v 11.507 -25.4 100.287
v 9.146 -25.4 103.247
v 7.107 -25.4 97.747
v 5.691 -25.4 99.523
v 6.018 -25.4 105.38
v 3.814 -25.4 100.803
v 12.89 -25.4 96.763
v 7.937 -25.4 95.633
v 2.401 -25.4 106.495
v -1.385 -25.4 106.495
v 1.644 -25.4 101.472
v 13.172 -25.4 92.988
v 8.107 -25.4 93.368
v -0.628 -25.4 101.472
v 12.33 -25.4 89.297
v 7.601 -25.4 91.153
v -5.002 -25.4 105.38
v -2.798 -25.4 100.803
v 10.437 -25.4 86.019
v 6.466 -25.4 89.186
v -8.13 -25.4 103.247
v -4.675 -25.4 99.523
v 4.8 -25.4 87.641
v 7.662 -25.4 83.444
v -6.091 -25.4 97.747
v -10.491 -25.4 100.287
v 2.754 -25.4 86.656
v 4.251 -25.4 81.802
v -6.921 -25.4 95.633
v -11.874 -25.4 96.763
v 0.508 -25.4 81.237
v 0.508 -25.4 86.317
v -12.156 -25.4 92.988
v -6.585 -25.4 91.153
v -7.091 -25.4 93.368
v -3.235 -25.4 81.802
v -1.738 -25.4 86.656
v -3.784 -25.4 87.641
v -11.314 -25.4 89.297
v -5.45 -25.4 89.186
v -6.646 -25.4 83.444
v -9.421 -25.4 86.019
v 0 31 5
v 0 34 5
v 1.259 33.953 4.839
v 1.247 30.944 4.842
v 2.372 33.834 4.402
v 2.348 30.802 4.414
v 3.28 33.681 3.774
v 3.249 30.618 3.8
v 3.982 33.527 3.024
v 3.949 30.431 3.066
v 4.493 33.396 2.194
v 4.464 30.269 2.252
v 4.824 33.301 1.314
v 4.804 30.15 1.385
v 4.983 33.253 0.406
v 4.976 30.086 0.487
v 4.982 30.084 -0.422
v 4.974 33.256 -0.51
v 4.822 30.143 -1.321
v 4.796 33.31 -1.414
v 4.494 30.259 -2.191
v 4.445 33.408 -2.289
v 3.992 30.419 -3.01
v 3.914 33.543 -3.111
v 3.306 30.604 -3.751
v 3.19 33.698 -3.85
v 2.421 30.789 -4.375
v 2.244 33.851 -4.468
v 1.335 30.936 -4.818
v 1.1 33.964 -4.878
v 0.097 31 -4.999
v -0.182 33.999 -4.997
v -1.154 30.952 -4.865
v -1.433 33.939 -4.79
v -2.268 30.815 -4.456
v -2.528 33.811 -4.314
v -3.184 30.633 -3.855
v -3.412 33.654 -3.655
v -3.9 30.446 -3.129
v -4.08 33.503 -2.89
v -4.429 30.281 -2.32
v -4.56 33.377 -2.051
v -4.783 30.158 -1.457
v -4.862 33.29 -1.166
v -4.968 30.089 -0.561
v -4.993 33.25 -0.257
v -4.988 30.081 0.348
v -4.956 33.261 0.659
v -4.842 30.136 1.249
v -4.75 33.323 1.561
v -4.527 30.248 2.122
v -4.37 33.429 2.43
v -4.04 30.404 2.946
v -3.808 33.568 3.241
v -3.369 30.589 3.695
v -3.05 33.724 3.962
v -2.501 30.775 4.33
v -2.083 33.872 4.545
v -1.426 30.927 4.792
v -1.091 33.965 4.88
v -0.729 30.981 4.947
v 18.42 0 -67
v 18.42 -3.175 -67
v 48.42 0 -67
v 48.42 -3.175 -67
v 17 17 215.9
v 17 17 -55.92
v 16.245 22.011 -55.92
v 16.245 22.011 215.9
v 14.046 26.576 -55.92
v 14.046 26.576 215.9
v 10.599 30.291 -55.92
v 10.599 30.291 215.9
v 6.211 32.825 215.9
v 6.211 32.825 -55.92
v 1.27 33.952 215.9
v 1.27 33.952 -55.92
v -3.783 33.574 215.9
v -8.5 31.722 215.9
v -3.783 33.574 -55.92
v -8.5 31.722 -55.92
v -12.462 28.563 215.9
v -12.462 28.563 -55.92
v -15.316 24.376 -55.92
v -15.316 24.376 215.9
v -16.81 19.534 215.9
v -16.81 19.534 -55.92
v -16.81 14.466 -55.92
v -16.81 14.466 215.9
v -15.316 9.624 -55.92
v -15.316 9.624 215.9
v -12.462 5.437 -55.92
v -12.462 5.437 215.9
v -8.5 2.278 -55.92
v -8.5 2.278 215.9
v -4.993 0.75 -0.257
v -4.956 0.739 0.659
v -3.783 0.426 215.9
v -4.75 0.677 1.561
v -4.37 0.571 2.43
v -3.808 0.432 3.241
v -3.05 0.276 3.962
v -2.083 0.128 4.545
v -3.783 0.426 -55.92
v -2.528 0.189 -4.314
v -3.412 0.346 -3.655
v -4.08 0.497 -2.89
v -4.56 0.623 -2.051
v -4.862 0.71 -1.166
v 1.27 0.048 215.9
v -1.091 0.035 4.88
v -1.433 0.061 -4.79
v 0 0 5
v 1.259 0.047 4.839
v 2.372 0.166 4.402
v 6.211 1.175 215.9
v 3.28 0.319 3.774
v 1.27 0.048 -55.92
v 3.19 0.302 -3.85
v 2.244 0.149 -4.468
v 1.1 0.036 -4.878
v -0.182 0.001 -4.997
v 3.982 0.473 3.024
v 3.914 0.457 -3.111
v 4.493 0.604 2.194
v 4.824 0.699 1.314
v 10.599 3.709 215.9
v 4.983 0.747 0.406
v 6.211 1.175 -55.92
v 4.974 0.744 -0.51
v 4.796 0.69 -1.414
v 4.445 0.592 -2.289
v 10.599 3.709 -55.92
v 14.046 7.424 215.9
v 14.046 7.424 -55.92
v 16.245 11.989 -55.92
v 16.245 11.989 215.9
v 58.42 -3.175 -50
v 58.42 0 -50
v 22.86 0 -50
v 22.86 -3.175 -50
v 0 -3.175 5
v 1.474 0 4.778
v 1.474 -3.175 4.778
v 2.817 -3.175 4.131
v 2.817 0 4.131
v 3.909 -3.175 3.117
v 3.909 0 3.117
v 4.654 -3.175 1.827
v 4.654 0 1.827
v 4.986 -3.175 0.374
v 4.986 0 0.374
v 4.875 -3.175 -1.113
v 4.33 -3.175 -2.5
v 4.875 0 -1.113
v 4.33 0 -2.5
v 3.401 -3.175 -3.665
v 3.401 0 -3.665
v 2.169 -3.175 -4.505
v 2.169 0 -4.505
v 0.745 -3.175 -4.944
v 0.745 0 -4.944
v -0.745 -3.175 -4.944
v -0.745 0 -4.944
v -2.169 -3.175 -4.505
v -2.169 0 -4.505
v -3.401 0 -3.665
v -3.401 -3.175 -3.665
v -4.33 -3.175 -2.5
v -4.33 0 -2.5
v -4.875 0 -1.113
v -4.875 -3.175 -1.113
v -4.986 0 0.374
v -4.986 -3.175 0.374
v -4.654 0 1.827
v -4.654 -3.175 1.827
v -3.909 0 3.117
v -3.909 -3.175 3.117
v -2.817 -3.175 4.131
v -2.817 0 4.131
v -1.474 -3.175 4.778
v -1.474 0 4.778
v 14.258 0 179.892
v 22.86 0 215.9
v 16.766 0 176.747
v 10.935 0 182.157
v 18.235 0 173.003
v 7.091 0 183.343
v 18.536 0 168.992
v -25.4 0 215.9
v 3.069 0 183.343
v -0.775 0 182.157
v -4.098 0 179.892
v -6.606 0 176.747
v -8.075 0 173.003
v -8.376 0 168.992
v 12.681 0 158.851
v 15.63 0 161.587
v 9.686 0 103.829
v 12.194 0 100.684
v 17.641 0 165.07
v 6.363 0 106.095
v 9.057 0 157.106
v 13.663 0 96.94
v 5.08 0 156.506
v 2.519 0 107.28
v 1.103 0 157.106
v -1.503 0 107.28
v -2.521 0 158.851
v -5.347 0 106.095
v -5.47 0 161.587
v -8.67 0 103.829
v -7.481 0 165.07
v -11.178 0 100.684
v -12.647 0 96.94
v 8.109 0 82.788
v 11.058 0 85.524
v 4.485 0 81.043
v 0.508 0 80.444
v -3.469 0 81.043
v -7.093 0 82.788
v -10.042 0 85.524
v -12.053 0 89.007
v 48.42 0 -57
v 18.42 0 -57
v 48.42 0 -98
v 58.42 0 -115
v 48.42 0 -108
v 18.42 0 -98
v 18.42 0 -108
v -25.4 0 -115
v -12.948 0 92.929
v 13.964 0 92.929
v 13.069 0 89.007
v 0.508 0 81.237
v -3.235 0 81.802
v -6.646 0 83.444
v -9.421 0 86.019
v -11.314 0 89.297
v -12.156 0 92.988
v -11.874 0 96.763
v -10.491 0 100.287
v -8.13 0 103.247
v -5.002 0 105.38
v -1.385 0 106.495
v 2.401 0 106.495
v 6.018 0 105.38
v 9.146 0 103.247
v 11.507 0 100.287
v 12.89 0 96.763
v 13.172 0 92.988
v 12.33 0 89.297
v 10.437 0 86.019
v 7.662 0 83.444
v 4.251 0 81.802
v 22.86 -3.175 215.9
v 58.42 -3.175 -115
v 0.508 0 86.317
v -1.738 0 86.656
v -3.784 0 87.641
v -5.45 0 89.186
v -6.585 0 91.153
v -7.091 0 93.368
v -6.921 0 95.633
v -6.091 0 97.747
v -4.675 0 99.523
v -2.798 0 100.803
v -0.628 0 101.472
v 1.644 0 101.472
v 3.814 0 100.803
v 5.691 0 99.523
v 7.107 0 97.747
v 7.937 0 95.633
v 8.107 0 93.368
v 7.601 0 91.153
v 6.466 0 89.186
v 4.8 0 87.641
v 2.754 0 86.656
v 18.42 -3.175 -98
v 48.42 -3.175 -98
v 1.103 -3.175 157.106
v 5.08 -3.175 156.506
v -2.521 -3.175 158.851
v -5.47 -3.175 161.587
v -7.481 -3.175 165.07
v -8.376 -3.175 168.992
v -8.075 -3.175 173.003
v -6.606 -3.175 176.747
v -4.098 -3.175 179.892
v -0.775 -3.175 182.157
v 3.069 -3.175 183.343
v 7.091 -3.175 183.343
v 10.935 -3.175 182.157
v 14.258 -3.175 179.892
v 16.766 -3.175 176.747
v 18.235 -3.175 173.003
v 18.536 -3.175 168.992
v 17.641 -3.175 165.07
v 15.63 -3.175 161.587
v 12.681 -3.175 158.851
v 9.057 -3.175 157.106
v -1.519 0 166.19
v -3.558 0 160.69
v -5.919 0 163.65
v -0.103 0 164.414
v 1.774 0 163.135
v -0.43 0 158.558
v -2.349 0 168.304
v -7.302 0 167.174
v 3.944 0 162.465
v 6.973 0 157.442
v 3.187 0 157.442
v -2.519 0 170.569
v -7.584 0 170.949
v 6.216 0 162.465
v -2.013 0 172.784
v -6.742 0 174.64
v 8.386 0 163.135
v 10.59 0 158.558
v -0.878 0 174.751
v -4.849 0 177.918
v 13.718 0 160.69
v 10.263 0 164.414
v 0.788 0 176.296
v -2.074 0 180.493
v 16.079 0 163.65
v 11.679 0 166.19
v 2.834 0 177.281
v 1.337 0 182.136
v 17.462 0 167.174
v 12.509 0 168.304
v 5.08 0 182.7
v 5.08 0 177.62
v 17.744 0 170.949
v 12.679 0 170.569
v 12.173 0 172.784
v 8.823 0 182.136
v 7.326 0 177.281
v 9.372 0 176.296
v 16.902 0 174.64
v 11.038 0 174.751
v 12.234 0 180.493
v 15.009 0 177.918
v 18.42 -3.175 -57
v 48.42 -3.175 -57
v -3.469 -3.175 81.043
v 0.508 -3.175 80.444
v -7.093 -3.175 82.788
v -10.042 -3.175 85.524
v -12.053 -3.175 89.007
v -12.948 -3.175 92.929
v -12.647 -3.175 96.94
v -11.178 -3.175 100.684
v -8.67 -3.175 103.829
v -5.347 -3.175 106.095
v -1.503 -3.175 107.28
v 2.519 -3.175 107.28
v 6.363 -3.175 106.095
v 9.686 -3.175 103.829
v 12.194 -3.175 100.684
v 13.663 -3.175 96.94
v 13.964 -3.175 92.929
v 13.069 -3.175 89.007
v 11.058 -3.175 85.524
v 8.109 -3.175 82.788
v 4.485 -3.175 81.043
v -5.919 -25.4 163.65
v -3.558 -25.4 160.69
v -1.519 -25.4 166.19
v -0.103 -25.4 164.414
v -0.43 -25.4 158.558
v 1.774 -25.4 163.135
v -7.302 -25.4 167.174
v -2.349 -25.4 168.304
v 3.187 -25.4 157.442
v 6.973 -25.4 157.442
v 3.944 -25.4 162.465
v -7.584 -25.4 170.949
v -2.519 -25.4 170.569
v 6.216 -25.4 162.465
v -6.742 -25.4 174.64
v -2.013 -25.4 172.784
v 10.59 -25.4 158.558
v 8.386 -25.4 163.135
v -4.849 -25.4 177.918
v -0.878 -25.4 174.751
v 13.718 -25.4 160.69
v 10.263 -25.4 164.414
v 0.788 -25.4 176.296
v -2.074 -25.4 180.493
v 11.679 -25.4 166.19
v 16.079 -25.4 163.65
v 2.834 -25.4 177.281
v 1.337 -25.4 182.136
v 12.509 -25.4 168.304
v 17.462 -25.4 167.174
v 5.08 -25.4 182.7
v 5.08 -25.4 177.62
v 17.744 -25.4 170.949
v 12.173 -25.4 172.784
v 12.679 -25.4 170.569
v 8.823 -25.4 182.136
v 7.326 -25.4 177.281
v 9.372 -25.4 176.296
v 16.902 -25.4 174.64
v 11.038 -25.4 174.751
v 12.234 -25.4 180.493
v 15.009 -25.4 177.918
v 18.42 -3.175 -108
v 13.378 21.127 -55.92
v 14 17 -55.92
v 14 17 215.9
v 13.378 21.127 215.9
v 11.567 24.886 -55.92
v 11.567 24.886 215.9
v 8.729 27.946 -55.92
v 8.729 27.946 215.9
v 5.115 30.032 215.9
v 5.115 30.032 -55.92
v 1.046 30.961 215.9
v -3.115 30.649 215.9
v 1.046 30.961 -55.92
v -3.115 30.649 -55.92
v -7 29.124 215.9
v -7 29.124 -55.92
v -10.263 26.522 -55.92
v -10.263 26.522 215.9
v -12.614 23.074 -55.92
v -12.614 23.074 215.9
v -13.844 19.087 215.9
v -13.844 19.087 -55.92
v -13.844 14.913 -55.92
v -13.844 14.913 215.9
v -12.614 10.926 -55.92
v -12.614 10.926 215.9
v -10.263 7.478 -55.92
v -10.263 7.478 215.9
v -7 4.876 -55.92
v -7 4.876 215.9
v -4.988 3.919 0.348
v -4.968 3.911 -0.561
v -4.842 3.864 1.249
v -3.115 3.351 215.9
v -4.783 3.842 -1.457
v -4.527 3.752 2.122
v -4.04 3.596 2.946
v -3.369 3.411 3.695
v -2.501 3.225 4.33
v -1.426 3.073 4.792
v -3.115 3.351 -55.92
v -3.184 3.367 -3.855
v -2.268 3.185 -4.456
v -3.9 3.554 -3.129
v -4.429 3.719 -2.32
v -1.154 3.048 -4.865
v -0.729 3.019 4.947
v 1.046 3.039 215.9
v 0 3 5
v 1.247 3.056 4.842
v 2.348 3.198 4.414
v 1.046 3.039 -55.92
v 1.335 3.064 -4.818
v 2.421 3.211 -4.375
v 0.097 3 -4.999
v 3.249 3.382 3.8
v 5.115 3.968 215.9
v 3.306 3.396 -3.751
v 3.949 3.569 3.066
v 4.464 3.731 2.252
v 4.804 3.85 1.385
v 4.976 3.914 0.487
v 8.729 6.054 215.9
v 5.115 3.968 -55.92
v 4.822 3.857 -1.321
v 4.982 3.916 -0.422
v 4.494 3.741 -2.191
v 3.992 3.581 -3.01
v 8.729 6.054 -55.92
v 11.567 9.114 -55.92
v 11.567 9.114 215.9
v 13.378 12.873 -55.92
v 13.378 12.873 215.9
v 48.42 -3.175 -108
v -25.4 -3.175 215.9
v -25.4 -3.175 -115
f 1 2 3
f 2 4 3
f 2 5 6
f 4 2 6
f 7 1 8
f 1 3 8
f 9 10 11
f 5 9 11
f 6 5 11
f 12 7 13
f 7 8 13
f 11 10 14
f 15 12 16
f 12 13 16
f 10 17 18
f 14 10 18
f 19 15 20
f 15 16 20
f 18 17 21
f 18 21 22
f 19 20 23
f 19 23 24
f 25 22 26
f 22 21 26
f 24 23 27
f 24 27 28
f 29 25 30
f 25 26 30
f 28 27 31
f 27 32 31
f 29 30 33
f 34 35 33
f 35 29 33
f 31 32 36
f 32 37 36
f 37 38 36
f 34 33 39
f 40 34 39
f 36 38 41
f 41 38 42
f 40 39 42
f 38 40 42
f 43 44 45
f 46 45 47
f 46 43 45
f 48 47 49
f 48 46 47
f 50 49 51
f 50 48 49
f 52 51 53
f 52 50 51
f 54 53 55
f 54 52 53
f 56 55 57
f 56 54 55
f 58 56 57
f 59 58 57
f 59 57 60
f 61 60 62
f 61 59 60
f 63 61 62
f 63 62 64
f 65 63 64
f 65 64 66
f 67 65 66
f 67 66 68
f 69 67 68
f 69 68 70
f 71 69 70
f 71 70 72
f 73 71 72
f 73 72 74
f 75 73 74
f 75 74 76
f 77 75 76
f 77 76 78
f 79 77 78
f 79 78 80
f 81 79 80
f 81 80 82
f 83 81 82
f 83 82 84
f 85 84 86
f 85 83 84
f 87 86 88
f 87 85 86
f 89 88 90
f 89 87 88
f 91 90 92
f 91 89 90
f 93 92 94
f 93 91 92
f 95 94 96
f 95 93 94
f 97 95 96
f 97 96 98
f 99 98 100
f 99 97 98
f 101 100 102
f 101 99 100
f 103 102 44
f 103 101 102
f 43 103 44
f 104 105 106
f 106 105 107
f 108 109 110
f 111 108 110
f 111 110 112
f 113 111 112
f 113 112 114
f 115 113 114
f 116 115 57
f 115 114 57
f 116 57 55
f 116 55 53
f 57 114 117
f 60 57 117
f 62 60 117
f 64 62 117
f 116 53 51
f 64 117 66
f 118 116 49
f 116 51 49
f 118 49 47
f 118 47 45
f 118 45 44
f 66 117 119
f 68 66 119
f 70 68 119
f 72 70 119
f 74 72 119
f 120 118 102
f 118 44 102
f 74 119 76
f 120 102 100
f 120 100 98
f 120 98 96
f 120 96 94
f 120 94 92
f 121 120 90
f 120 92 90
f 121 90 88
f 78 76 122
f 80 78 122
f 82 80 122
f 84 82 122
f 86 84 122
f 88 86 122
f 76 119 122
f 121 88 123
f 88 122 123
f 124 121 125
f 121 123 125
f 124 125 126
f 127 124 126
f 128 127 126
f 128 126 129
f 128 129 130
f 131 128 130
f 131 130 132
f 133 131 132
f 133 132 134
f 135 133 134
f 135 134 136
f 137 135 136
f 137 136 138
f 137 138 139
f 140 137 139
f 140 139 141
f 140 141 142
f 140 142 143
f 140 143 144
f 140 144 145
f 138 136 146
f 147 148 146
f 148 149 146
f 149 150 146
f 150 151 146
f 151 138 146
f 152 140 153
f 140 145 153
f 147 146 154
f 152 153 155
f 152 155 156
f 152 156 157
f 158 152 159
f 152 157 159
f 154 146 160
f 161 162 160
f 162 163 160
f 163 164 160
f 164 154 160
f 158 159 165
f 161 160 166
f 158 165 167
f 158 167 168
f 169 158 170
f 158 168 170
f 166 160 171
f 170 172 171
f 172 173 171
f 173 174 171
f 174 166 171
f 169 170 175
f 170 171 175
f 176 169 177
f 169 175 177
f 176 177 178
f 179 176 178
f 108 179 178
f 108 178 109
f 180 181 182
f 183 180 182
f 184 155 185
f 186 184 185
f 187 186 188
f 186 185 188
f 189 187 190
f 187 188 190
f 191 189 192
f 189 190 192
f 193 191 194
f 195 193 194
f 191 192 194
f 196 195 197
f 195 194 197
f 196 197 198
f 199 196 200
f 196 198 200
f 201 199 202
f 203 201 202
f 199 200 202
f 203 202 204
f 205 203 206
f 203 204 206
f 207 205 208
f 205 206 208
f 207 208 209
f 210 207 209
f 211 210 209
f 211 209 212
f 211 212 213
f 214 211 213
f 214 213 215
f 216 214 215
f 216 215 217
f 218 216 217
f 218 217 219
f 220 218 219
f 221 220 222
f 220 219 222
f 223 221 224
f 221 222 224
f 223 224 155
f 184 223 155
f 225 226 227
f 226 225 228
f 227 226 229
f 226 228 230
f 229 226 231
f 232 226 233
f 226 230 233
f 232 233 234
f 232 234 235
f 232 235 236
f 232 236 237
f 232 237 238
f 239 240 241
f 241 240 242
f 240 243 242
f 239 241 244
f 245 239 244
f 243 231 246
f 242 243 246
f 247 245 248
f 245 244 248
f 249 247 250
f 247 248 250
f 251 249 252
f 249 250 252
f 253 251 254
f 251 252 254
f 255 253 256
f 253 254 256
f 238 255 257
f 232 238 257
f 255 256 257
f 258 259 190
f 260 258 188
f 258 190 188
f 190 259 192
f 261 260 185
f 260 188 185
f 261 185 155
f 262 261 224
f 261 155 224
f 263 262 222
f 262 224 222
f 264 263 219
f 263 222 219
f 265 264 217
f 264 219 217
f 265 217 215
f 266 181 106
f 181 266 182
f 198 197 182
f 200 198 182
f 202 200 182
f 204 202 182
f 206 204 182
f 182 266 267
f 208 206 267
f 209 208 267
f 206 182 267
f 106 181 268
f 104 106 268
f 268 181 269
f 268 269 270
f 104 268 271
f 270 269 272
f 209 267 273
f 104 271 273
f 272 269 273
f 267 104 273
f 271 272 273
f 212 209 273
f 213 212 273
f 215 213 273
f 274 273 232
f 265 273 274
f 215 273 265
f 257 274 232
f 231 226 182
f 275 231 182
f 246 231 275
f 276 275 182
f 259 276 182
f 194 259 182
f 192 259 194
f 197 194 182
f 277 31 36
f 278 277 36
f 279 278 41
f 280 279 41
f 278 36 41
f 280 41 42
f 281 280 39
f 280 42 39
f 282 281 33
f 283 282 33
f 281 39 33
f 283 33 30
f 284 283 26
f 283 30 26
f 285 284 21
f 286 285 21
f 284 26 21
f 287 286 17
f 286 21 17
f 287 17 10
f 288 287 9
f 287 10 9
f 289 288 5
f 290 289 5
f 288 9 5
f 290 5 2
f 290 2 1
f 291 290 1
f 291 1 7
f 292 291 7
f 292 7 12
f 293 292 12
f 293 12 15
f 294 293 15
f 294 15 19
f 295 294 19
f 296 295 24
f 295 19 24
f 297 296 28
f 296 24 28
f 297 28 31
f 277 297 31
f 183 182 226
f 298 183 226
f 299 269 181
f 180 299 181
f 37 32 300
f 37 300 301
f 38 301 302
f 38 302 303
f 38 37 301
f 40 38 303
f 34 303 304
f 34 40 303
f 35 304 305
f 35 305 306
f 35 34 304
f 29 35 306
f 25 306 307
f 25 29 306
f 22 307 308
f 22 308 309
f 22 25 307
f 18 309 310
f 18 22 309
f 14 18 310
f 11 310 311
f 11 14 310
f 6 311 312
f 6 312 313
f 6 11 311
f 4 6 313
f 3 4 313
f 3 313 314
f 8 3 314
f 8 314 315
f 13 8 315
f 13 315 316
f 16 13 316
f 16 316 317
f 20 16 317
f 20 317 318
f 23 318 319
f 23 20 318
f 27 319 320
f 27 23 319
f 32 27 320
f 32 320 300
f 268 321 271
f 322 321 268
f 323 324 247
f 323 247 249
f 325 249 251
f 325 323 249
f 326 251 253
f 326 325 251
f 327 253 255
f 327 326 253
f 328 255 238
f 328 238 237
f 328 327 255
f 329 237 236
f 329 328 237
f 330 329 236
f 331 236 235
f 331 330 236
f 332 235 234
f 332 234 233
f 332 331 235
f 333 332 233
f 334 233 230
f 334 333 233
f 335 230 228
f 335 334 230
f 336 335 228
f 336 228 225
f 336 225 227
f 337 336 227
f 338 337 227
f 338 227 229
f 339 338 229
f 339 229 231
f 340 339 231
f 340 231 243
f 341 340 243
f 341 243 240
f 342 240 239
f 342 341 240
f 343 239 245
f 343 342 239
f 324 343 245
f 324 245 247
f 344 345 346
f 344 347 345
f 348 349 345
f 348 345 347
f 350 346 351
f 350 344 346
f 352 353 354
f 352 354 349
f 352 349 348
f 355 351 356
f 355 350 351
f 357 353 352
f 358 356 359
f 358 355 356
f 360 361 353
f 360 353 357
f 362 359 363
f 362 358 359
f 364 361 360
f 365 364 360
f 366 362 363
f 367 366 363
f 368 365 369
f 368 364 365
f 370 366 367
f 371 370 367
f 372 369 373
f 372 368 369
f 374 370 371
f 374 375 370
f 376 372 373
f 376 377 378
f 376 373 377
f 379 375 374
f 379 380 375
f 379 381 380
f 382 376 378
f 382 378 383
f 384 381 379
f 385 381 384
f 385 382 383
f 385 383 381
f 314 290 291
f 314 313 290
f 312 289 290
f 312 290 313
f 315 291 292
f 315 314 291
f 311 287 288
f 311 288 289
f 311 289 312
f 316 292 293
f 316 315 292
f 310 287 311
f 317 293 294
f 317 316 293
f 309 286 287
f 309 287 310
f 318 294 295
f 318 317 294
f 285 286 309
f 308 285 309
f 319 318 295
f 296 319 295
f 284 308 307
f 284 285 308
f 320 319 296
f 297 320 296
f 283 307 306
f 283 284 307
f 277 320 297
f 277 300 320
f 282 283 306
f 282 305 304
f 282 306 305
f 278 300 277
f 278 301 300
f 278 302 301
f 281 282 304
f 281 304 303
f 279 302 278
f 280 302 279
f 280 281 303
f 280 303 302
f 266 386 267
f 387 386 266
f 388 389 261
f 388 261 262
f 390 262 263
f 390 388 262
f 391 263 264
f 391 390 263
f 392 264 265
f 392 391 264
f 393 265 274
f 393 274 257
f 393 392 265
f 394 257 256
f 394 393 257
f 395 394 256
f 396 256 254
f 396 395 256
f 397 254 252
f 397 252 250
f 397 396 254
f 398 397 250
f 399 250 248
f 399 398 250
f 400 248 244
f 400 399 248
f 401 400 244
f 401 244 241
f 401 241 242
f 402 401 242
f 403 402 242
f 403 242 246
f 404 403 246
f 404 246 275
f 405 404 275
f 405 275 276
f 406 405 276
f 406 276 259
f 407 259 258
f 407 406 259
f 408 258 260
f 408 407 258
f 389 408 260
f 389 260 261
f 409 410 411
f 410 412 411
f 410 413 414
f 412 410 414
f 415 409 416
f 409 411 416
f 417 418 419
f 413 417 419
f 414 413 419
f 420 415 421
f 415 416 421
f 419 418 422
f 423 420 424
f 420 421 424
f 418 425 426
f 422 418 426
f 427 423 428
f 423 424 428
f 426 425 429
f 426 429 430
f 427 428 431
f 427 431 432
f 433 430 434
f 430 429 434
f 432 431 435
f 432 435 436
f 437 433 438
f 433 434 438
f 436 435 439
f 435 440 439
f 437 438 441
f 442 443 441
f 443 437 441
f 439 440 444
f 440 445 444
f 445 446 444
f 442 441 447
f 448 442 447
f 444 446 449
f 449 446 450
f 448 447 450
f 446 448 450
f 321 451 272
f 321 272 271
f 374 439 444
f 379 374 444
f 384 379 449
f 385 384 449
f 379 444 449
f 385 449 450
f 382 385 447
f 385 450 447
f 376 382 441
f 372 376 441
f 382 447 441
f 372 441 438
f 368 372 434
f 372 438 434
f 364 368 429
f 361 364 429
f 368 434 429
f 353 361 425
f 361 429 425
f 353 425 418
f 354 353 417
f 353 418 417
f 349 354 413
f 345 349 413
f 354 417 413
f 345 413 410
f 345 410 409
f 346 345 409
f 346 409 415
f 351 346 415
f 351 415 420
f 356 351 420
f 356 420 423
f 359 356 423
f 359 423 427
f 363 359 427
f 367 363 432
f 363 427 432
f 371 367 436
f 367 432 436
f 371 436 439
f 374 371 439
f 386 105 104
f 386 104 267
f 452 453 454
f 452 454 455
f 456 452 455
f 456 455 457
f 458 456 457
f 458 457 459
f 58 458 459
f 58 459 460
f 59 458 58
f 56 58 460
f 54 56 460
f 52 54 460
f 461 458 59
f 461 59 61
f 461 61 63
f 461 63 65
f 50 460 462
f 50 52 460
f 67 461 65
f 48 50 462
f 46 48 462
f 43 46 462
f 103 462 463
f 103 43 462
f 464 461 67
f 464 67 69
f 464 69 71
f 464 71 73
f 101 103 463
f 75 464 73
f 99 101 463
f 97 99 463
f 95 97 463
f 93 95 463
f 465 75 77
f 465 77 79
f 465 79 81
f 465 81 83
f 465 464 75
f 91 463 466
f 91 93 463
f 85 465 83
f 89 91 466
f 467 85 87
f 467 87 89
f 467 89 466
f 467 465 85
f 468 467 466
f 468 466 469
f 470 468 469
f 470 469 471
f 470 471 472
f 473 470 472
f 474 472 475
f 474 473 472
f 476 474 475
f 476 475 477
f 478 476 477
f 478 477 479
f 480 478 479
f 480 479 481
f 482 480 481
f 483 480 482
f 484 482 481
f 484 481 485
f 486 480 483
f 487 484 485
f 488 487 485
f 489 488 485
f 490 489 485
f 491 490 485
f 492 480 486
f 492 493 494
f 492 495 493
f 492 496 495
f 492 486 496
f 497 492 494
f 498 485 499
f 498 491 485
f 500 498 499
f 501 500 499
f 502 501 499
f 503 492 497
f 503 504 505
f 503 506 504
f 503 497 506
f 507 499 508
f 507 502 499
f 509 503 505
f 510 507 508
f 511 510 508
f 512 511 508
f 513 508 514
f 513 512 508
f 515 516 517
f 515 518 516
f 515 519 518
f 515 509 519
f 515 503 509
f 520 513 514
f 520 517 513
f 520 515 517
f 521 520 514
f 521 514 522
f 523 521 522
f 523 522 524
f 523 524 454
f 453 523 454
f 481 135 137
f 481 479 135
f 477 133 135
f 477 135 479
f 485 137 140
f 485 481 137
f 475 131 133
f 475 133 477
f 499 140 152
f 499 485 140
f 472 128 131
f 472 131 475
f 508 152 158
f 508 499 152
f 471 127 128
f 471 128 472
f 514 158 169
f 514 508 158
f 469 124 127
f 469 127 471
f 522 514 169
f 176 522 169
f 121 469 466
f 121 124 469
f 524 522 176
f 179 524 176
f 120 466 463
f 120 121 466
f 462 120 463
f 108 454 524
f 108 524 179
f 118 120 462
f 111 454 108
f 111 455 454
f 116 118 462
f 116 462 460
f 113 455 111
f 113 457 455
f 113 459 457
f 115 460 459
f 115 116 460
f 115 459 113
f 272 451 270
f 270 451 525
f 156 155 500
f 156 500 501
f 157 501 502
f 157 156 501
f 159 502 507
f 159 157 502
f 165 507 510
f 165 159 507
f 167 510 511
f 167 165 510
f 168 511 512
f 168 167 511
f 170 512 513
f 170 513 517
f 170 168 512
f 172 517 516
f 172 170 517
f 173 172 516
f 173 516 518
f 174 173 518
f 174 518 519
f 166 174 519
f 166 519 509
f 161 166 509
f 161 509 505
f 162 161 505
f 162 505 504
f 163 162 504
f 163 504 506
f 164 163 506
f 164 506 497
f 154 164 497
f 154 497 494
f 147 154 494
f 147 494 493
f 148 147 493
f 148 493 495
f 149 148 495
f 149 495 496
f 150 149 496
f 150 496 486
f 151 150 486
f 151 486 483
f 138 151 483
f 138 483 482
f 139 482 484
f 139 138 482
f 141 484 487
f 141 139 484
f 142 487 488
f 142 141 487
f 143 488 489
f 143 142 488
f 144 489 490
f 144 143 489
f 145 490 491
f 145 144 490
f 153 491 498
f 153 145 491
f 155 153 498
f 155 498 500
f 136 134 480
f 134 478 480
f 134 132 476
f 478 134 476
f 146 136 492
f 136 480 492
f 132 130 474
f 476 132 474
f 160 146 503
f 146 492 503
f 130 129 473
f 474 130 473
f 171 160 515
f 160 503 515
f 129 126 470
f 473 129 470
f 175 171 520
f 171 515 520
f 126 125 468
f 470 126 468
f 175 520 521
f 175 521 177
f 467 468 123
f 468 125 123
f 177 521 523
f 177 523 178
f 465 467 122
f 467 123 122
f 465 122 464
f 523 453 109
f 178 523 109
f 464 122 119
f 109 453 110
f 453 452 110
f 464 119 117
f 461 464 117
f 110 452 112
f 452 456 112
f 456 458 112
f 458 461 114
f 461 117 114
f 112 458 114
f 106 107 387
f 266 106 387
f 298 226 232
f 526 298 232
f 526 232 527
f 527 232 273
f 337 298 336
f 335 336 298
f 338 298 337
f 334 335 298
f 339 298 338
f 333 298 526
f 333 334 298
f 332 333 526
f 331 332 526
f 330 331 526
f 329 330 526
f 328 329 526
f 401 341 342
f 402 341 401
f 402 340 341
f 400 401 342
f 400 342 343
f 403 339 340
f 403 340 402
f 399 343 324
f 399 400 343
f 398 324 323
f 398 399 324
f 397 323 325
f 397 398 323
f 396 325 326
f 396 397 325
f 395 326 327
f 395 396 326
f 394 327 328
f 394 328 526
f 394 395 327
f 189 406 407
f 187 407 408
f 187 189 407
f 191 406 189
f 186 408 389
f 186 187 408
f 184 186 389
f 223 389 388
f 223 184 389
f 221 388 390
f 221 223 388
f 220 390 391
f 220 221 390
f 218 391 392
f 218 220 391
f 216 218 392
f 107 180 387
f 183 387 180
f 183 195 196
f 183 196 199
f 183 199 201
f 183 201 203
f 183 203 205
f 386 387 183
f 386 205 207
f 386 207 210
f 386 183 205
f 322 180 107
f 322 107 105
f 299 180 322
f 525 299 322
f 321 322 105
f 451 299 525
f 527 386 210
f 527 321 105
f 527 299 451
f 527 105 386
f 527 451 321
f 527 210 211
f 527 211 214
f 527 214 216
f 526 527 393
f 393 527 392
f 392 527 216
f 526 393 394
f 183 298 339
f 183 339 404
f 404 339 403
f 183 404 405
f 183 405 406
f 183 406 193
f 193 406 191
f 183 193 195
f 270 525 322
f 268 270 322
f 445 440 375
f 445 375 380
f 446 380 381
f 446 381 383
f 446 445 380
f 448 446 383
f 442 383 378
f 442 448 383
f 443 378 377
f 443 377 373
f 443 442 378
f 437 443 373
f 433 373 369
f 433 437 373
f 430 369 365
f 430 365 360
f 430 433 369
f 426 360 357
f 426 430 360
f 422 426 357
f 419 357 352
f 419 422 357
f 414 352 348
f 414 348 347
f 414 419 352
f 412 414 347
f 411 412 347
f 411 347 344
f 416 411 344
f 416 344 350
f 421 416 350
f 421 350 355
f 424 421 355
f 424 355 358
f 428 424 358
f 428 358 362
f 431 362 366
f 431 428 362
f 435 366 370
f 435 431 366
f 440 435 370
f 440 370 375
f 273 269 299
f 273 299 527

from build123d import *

# Parameters (mm, degrees)
SKETCH1_R                  = 5
BASE_FLANGE1_DEPTH         = 3.175
BOSS_EXTRUDE2_DEPTH        = 215.9
BOSS_EXTRUDE2_DEPTH_BACK   = 55.92
SKETCH7_R                  = 17
SKETCH7_R_2                = 14
CUT_EXTRUDE1_DEPTH         = 227.233742841
CUT_EXTRUDE1_DEPTH_BACK    = 227.233742841
SKETCH8_R                  = 5
SKETCH9_W                  = 30
SKETCH9_H                  = 10
CUT_EXTRUDE2_DEPTH         = 3.175
SKETCH6_R                  = 13.49375
CUT_EXTRUDE4_DEPTH         = 3.175
BOSS_EXTRUDE3_DEPTH        = 3.175
BOSS_EXTRUDE3_DEPTH_BACK   = 22.225
SKETCH6_5_R                = 12.7
SKETCH6_5_R_2              = 7.62
BOSS_EXTRUDE3_2_DEPTH      = 3.175
BOSS_EXTRUDE3_2_DEPTH_BACK = 22.225


# Sheet-metal steps are written as plain solids
with BuildPart() as part:
    # Sketch1 → Base-Flange1 (new body)
    with BuildSketch(Plane(origin=(0, 0, 0), x_dir=(1, 0, 0), z_dir=(0, 1, 0))):
        Polygon((22.86, -215.9), (-25.4, -215.9), (-25.4, 115), (22.86, 115), (58.42, 115), (58.42, 50), (22.86, 50), align=None)
        with Locations(Location((0, 0, 0), (0, 0, 270))):
            Circle(SKETCH1_R, mode=Mode.SUBTRACT)
    extrude(amount=-BASE_FLANGE1_DEPTH)

    # Sketch9 → Cut-Extrude2 (cut)
    with BuildSketch(Plane.XZ.offset(3.175)):
        with Locations((33.42, -103)):
            Rectangle(SKETCH9_W, SKETCH9_H)
        with Locations((33.42, -62)):
            Rectangle(SKETCH9_W, SKETCH9_H)
    extrude(amount=-CUT_EXTRUDE2_DEPTH, mode=Mode.SUBTRACT)

    # Sketch6 → Cut-Extrude4 (cut)
    with BuildSketch(Plane(origin=(0, -3.175, 0), x_dir=(1, 0, 0), z_dir=(0, 1, 0))):
        with Locations(Location((5.08, -170, 0), (0, 0, 90))):
            Circle(SKETCH6_R)
        with Locations(Location((0.508, -93.937283667, 0), (0, 0, 90))):
            Circle(SKETCH6_R)
    extrude(amount=CUT_EXTRUDE4_DEPTH, mode=Mode.SUBTRACT)


with BuildPart() as body_2:
    # Sketch7 → Boss-Extrude2 (new, two sides: drawn at the far end of the back side and taken through both)
    with BuildSketch(Plane.XY.offset(-BOSS_EXTRUDE2_DEPTH_BACK)):
        with Locations((0, 17)):
            Circle(SKETCH7_R)
        with Locations((0, 17)):
            Circle(SKETCH7_R_2, mode=Mode.SUBTRACT)
    extrude(amount=BOSS_EXTRUDE2_DEPTH + BOSS_EXTRUDE2_DEPTH_BACK)

    # Sketch8 → Cut-Extrude1 (cut, two sides: drawn at the far end of the back side and taken through both)
    with BuildSketch(Plane(origin=(0, 0, 0), x_dir=(1, 0, 0), z_dir=(0, 1, 0)).offset(-CUT_EXTRUDE1_DEPTH_BACK)):
        with Locations(Location((0, 0, 0), (0, 0, 270))):
            Circle(SKETCH8_R)
    extrude(amount=CUT_EXTRUDE1_DEPTH + CUT_EXTRUDE1_DEPTH_BACK, mode=Mode.SUBTRACT)


with BuildPart() as body_3:
    # Sketch6<5> → Boss-Extrude3 (new, two sides: drawn at the far end of the back side and taken through both)
    with BuildSketch(Plane(origin=(0, -3.175, 0), x_dir=(1, 0, 0), z_dir=(0, 1, 0)).offset(-BOSS_EXTRUDE3_DEPTH_BACK)):
        with Locations(Location((5.08, -170, 0), (0, 0, 270))):
            Circle(SKETCH6_5_R)
        with Locations(Location((5.08, -170, 0), (0, 0, 270))):
            Circle(SKETCH6_5_R_2, mode=Mode.SUBTRACT)
    extrude(amount=BOSS_EXTRUDE3_DEPTH + BOSS_EXTRUDE3_DEPTH_BACK)


with BuildPart() as body_4:
    # Sketch6<5> → Boss-Extrude3 2 (new, two sides: drawn at the far end of the back side and taken through both)
    with BuildSketch(Plane(origin=(0, -3.175, 0), x_dir=(1, 0, 0), z_dir=(0, 1, 0)).offset(-BOSS_EXTRUDE3_2_DEPTH_BACK)):
        with Locations(Location((0.508, -93.937283667, 0), (0, 0, 90))):
            Circle(SKETCH6_5_R)
        with Locations(Location((0.508, -93.937283667, 0), (0, 0, 90))):
            Circle(SKETCH6_5_R_2, mode=Mode.SUBTRACT)
    extrude(amount=BOSS_EXTRUDE3_2_DEPTH + BOSS_EXTRUDE3_2_DEPTH_BACK)


solid = Compound([part.part, body_2.part, body_3.part, body_4.part])
